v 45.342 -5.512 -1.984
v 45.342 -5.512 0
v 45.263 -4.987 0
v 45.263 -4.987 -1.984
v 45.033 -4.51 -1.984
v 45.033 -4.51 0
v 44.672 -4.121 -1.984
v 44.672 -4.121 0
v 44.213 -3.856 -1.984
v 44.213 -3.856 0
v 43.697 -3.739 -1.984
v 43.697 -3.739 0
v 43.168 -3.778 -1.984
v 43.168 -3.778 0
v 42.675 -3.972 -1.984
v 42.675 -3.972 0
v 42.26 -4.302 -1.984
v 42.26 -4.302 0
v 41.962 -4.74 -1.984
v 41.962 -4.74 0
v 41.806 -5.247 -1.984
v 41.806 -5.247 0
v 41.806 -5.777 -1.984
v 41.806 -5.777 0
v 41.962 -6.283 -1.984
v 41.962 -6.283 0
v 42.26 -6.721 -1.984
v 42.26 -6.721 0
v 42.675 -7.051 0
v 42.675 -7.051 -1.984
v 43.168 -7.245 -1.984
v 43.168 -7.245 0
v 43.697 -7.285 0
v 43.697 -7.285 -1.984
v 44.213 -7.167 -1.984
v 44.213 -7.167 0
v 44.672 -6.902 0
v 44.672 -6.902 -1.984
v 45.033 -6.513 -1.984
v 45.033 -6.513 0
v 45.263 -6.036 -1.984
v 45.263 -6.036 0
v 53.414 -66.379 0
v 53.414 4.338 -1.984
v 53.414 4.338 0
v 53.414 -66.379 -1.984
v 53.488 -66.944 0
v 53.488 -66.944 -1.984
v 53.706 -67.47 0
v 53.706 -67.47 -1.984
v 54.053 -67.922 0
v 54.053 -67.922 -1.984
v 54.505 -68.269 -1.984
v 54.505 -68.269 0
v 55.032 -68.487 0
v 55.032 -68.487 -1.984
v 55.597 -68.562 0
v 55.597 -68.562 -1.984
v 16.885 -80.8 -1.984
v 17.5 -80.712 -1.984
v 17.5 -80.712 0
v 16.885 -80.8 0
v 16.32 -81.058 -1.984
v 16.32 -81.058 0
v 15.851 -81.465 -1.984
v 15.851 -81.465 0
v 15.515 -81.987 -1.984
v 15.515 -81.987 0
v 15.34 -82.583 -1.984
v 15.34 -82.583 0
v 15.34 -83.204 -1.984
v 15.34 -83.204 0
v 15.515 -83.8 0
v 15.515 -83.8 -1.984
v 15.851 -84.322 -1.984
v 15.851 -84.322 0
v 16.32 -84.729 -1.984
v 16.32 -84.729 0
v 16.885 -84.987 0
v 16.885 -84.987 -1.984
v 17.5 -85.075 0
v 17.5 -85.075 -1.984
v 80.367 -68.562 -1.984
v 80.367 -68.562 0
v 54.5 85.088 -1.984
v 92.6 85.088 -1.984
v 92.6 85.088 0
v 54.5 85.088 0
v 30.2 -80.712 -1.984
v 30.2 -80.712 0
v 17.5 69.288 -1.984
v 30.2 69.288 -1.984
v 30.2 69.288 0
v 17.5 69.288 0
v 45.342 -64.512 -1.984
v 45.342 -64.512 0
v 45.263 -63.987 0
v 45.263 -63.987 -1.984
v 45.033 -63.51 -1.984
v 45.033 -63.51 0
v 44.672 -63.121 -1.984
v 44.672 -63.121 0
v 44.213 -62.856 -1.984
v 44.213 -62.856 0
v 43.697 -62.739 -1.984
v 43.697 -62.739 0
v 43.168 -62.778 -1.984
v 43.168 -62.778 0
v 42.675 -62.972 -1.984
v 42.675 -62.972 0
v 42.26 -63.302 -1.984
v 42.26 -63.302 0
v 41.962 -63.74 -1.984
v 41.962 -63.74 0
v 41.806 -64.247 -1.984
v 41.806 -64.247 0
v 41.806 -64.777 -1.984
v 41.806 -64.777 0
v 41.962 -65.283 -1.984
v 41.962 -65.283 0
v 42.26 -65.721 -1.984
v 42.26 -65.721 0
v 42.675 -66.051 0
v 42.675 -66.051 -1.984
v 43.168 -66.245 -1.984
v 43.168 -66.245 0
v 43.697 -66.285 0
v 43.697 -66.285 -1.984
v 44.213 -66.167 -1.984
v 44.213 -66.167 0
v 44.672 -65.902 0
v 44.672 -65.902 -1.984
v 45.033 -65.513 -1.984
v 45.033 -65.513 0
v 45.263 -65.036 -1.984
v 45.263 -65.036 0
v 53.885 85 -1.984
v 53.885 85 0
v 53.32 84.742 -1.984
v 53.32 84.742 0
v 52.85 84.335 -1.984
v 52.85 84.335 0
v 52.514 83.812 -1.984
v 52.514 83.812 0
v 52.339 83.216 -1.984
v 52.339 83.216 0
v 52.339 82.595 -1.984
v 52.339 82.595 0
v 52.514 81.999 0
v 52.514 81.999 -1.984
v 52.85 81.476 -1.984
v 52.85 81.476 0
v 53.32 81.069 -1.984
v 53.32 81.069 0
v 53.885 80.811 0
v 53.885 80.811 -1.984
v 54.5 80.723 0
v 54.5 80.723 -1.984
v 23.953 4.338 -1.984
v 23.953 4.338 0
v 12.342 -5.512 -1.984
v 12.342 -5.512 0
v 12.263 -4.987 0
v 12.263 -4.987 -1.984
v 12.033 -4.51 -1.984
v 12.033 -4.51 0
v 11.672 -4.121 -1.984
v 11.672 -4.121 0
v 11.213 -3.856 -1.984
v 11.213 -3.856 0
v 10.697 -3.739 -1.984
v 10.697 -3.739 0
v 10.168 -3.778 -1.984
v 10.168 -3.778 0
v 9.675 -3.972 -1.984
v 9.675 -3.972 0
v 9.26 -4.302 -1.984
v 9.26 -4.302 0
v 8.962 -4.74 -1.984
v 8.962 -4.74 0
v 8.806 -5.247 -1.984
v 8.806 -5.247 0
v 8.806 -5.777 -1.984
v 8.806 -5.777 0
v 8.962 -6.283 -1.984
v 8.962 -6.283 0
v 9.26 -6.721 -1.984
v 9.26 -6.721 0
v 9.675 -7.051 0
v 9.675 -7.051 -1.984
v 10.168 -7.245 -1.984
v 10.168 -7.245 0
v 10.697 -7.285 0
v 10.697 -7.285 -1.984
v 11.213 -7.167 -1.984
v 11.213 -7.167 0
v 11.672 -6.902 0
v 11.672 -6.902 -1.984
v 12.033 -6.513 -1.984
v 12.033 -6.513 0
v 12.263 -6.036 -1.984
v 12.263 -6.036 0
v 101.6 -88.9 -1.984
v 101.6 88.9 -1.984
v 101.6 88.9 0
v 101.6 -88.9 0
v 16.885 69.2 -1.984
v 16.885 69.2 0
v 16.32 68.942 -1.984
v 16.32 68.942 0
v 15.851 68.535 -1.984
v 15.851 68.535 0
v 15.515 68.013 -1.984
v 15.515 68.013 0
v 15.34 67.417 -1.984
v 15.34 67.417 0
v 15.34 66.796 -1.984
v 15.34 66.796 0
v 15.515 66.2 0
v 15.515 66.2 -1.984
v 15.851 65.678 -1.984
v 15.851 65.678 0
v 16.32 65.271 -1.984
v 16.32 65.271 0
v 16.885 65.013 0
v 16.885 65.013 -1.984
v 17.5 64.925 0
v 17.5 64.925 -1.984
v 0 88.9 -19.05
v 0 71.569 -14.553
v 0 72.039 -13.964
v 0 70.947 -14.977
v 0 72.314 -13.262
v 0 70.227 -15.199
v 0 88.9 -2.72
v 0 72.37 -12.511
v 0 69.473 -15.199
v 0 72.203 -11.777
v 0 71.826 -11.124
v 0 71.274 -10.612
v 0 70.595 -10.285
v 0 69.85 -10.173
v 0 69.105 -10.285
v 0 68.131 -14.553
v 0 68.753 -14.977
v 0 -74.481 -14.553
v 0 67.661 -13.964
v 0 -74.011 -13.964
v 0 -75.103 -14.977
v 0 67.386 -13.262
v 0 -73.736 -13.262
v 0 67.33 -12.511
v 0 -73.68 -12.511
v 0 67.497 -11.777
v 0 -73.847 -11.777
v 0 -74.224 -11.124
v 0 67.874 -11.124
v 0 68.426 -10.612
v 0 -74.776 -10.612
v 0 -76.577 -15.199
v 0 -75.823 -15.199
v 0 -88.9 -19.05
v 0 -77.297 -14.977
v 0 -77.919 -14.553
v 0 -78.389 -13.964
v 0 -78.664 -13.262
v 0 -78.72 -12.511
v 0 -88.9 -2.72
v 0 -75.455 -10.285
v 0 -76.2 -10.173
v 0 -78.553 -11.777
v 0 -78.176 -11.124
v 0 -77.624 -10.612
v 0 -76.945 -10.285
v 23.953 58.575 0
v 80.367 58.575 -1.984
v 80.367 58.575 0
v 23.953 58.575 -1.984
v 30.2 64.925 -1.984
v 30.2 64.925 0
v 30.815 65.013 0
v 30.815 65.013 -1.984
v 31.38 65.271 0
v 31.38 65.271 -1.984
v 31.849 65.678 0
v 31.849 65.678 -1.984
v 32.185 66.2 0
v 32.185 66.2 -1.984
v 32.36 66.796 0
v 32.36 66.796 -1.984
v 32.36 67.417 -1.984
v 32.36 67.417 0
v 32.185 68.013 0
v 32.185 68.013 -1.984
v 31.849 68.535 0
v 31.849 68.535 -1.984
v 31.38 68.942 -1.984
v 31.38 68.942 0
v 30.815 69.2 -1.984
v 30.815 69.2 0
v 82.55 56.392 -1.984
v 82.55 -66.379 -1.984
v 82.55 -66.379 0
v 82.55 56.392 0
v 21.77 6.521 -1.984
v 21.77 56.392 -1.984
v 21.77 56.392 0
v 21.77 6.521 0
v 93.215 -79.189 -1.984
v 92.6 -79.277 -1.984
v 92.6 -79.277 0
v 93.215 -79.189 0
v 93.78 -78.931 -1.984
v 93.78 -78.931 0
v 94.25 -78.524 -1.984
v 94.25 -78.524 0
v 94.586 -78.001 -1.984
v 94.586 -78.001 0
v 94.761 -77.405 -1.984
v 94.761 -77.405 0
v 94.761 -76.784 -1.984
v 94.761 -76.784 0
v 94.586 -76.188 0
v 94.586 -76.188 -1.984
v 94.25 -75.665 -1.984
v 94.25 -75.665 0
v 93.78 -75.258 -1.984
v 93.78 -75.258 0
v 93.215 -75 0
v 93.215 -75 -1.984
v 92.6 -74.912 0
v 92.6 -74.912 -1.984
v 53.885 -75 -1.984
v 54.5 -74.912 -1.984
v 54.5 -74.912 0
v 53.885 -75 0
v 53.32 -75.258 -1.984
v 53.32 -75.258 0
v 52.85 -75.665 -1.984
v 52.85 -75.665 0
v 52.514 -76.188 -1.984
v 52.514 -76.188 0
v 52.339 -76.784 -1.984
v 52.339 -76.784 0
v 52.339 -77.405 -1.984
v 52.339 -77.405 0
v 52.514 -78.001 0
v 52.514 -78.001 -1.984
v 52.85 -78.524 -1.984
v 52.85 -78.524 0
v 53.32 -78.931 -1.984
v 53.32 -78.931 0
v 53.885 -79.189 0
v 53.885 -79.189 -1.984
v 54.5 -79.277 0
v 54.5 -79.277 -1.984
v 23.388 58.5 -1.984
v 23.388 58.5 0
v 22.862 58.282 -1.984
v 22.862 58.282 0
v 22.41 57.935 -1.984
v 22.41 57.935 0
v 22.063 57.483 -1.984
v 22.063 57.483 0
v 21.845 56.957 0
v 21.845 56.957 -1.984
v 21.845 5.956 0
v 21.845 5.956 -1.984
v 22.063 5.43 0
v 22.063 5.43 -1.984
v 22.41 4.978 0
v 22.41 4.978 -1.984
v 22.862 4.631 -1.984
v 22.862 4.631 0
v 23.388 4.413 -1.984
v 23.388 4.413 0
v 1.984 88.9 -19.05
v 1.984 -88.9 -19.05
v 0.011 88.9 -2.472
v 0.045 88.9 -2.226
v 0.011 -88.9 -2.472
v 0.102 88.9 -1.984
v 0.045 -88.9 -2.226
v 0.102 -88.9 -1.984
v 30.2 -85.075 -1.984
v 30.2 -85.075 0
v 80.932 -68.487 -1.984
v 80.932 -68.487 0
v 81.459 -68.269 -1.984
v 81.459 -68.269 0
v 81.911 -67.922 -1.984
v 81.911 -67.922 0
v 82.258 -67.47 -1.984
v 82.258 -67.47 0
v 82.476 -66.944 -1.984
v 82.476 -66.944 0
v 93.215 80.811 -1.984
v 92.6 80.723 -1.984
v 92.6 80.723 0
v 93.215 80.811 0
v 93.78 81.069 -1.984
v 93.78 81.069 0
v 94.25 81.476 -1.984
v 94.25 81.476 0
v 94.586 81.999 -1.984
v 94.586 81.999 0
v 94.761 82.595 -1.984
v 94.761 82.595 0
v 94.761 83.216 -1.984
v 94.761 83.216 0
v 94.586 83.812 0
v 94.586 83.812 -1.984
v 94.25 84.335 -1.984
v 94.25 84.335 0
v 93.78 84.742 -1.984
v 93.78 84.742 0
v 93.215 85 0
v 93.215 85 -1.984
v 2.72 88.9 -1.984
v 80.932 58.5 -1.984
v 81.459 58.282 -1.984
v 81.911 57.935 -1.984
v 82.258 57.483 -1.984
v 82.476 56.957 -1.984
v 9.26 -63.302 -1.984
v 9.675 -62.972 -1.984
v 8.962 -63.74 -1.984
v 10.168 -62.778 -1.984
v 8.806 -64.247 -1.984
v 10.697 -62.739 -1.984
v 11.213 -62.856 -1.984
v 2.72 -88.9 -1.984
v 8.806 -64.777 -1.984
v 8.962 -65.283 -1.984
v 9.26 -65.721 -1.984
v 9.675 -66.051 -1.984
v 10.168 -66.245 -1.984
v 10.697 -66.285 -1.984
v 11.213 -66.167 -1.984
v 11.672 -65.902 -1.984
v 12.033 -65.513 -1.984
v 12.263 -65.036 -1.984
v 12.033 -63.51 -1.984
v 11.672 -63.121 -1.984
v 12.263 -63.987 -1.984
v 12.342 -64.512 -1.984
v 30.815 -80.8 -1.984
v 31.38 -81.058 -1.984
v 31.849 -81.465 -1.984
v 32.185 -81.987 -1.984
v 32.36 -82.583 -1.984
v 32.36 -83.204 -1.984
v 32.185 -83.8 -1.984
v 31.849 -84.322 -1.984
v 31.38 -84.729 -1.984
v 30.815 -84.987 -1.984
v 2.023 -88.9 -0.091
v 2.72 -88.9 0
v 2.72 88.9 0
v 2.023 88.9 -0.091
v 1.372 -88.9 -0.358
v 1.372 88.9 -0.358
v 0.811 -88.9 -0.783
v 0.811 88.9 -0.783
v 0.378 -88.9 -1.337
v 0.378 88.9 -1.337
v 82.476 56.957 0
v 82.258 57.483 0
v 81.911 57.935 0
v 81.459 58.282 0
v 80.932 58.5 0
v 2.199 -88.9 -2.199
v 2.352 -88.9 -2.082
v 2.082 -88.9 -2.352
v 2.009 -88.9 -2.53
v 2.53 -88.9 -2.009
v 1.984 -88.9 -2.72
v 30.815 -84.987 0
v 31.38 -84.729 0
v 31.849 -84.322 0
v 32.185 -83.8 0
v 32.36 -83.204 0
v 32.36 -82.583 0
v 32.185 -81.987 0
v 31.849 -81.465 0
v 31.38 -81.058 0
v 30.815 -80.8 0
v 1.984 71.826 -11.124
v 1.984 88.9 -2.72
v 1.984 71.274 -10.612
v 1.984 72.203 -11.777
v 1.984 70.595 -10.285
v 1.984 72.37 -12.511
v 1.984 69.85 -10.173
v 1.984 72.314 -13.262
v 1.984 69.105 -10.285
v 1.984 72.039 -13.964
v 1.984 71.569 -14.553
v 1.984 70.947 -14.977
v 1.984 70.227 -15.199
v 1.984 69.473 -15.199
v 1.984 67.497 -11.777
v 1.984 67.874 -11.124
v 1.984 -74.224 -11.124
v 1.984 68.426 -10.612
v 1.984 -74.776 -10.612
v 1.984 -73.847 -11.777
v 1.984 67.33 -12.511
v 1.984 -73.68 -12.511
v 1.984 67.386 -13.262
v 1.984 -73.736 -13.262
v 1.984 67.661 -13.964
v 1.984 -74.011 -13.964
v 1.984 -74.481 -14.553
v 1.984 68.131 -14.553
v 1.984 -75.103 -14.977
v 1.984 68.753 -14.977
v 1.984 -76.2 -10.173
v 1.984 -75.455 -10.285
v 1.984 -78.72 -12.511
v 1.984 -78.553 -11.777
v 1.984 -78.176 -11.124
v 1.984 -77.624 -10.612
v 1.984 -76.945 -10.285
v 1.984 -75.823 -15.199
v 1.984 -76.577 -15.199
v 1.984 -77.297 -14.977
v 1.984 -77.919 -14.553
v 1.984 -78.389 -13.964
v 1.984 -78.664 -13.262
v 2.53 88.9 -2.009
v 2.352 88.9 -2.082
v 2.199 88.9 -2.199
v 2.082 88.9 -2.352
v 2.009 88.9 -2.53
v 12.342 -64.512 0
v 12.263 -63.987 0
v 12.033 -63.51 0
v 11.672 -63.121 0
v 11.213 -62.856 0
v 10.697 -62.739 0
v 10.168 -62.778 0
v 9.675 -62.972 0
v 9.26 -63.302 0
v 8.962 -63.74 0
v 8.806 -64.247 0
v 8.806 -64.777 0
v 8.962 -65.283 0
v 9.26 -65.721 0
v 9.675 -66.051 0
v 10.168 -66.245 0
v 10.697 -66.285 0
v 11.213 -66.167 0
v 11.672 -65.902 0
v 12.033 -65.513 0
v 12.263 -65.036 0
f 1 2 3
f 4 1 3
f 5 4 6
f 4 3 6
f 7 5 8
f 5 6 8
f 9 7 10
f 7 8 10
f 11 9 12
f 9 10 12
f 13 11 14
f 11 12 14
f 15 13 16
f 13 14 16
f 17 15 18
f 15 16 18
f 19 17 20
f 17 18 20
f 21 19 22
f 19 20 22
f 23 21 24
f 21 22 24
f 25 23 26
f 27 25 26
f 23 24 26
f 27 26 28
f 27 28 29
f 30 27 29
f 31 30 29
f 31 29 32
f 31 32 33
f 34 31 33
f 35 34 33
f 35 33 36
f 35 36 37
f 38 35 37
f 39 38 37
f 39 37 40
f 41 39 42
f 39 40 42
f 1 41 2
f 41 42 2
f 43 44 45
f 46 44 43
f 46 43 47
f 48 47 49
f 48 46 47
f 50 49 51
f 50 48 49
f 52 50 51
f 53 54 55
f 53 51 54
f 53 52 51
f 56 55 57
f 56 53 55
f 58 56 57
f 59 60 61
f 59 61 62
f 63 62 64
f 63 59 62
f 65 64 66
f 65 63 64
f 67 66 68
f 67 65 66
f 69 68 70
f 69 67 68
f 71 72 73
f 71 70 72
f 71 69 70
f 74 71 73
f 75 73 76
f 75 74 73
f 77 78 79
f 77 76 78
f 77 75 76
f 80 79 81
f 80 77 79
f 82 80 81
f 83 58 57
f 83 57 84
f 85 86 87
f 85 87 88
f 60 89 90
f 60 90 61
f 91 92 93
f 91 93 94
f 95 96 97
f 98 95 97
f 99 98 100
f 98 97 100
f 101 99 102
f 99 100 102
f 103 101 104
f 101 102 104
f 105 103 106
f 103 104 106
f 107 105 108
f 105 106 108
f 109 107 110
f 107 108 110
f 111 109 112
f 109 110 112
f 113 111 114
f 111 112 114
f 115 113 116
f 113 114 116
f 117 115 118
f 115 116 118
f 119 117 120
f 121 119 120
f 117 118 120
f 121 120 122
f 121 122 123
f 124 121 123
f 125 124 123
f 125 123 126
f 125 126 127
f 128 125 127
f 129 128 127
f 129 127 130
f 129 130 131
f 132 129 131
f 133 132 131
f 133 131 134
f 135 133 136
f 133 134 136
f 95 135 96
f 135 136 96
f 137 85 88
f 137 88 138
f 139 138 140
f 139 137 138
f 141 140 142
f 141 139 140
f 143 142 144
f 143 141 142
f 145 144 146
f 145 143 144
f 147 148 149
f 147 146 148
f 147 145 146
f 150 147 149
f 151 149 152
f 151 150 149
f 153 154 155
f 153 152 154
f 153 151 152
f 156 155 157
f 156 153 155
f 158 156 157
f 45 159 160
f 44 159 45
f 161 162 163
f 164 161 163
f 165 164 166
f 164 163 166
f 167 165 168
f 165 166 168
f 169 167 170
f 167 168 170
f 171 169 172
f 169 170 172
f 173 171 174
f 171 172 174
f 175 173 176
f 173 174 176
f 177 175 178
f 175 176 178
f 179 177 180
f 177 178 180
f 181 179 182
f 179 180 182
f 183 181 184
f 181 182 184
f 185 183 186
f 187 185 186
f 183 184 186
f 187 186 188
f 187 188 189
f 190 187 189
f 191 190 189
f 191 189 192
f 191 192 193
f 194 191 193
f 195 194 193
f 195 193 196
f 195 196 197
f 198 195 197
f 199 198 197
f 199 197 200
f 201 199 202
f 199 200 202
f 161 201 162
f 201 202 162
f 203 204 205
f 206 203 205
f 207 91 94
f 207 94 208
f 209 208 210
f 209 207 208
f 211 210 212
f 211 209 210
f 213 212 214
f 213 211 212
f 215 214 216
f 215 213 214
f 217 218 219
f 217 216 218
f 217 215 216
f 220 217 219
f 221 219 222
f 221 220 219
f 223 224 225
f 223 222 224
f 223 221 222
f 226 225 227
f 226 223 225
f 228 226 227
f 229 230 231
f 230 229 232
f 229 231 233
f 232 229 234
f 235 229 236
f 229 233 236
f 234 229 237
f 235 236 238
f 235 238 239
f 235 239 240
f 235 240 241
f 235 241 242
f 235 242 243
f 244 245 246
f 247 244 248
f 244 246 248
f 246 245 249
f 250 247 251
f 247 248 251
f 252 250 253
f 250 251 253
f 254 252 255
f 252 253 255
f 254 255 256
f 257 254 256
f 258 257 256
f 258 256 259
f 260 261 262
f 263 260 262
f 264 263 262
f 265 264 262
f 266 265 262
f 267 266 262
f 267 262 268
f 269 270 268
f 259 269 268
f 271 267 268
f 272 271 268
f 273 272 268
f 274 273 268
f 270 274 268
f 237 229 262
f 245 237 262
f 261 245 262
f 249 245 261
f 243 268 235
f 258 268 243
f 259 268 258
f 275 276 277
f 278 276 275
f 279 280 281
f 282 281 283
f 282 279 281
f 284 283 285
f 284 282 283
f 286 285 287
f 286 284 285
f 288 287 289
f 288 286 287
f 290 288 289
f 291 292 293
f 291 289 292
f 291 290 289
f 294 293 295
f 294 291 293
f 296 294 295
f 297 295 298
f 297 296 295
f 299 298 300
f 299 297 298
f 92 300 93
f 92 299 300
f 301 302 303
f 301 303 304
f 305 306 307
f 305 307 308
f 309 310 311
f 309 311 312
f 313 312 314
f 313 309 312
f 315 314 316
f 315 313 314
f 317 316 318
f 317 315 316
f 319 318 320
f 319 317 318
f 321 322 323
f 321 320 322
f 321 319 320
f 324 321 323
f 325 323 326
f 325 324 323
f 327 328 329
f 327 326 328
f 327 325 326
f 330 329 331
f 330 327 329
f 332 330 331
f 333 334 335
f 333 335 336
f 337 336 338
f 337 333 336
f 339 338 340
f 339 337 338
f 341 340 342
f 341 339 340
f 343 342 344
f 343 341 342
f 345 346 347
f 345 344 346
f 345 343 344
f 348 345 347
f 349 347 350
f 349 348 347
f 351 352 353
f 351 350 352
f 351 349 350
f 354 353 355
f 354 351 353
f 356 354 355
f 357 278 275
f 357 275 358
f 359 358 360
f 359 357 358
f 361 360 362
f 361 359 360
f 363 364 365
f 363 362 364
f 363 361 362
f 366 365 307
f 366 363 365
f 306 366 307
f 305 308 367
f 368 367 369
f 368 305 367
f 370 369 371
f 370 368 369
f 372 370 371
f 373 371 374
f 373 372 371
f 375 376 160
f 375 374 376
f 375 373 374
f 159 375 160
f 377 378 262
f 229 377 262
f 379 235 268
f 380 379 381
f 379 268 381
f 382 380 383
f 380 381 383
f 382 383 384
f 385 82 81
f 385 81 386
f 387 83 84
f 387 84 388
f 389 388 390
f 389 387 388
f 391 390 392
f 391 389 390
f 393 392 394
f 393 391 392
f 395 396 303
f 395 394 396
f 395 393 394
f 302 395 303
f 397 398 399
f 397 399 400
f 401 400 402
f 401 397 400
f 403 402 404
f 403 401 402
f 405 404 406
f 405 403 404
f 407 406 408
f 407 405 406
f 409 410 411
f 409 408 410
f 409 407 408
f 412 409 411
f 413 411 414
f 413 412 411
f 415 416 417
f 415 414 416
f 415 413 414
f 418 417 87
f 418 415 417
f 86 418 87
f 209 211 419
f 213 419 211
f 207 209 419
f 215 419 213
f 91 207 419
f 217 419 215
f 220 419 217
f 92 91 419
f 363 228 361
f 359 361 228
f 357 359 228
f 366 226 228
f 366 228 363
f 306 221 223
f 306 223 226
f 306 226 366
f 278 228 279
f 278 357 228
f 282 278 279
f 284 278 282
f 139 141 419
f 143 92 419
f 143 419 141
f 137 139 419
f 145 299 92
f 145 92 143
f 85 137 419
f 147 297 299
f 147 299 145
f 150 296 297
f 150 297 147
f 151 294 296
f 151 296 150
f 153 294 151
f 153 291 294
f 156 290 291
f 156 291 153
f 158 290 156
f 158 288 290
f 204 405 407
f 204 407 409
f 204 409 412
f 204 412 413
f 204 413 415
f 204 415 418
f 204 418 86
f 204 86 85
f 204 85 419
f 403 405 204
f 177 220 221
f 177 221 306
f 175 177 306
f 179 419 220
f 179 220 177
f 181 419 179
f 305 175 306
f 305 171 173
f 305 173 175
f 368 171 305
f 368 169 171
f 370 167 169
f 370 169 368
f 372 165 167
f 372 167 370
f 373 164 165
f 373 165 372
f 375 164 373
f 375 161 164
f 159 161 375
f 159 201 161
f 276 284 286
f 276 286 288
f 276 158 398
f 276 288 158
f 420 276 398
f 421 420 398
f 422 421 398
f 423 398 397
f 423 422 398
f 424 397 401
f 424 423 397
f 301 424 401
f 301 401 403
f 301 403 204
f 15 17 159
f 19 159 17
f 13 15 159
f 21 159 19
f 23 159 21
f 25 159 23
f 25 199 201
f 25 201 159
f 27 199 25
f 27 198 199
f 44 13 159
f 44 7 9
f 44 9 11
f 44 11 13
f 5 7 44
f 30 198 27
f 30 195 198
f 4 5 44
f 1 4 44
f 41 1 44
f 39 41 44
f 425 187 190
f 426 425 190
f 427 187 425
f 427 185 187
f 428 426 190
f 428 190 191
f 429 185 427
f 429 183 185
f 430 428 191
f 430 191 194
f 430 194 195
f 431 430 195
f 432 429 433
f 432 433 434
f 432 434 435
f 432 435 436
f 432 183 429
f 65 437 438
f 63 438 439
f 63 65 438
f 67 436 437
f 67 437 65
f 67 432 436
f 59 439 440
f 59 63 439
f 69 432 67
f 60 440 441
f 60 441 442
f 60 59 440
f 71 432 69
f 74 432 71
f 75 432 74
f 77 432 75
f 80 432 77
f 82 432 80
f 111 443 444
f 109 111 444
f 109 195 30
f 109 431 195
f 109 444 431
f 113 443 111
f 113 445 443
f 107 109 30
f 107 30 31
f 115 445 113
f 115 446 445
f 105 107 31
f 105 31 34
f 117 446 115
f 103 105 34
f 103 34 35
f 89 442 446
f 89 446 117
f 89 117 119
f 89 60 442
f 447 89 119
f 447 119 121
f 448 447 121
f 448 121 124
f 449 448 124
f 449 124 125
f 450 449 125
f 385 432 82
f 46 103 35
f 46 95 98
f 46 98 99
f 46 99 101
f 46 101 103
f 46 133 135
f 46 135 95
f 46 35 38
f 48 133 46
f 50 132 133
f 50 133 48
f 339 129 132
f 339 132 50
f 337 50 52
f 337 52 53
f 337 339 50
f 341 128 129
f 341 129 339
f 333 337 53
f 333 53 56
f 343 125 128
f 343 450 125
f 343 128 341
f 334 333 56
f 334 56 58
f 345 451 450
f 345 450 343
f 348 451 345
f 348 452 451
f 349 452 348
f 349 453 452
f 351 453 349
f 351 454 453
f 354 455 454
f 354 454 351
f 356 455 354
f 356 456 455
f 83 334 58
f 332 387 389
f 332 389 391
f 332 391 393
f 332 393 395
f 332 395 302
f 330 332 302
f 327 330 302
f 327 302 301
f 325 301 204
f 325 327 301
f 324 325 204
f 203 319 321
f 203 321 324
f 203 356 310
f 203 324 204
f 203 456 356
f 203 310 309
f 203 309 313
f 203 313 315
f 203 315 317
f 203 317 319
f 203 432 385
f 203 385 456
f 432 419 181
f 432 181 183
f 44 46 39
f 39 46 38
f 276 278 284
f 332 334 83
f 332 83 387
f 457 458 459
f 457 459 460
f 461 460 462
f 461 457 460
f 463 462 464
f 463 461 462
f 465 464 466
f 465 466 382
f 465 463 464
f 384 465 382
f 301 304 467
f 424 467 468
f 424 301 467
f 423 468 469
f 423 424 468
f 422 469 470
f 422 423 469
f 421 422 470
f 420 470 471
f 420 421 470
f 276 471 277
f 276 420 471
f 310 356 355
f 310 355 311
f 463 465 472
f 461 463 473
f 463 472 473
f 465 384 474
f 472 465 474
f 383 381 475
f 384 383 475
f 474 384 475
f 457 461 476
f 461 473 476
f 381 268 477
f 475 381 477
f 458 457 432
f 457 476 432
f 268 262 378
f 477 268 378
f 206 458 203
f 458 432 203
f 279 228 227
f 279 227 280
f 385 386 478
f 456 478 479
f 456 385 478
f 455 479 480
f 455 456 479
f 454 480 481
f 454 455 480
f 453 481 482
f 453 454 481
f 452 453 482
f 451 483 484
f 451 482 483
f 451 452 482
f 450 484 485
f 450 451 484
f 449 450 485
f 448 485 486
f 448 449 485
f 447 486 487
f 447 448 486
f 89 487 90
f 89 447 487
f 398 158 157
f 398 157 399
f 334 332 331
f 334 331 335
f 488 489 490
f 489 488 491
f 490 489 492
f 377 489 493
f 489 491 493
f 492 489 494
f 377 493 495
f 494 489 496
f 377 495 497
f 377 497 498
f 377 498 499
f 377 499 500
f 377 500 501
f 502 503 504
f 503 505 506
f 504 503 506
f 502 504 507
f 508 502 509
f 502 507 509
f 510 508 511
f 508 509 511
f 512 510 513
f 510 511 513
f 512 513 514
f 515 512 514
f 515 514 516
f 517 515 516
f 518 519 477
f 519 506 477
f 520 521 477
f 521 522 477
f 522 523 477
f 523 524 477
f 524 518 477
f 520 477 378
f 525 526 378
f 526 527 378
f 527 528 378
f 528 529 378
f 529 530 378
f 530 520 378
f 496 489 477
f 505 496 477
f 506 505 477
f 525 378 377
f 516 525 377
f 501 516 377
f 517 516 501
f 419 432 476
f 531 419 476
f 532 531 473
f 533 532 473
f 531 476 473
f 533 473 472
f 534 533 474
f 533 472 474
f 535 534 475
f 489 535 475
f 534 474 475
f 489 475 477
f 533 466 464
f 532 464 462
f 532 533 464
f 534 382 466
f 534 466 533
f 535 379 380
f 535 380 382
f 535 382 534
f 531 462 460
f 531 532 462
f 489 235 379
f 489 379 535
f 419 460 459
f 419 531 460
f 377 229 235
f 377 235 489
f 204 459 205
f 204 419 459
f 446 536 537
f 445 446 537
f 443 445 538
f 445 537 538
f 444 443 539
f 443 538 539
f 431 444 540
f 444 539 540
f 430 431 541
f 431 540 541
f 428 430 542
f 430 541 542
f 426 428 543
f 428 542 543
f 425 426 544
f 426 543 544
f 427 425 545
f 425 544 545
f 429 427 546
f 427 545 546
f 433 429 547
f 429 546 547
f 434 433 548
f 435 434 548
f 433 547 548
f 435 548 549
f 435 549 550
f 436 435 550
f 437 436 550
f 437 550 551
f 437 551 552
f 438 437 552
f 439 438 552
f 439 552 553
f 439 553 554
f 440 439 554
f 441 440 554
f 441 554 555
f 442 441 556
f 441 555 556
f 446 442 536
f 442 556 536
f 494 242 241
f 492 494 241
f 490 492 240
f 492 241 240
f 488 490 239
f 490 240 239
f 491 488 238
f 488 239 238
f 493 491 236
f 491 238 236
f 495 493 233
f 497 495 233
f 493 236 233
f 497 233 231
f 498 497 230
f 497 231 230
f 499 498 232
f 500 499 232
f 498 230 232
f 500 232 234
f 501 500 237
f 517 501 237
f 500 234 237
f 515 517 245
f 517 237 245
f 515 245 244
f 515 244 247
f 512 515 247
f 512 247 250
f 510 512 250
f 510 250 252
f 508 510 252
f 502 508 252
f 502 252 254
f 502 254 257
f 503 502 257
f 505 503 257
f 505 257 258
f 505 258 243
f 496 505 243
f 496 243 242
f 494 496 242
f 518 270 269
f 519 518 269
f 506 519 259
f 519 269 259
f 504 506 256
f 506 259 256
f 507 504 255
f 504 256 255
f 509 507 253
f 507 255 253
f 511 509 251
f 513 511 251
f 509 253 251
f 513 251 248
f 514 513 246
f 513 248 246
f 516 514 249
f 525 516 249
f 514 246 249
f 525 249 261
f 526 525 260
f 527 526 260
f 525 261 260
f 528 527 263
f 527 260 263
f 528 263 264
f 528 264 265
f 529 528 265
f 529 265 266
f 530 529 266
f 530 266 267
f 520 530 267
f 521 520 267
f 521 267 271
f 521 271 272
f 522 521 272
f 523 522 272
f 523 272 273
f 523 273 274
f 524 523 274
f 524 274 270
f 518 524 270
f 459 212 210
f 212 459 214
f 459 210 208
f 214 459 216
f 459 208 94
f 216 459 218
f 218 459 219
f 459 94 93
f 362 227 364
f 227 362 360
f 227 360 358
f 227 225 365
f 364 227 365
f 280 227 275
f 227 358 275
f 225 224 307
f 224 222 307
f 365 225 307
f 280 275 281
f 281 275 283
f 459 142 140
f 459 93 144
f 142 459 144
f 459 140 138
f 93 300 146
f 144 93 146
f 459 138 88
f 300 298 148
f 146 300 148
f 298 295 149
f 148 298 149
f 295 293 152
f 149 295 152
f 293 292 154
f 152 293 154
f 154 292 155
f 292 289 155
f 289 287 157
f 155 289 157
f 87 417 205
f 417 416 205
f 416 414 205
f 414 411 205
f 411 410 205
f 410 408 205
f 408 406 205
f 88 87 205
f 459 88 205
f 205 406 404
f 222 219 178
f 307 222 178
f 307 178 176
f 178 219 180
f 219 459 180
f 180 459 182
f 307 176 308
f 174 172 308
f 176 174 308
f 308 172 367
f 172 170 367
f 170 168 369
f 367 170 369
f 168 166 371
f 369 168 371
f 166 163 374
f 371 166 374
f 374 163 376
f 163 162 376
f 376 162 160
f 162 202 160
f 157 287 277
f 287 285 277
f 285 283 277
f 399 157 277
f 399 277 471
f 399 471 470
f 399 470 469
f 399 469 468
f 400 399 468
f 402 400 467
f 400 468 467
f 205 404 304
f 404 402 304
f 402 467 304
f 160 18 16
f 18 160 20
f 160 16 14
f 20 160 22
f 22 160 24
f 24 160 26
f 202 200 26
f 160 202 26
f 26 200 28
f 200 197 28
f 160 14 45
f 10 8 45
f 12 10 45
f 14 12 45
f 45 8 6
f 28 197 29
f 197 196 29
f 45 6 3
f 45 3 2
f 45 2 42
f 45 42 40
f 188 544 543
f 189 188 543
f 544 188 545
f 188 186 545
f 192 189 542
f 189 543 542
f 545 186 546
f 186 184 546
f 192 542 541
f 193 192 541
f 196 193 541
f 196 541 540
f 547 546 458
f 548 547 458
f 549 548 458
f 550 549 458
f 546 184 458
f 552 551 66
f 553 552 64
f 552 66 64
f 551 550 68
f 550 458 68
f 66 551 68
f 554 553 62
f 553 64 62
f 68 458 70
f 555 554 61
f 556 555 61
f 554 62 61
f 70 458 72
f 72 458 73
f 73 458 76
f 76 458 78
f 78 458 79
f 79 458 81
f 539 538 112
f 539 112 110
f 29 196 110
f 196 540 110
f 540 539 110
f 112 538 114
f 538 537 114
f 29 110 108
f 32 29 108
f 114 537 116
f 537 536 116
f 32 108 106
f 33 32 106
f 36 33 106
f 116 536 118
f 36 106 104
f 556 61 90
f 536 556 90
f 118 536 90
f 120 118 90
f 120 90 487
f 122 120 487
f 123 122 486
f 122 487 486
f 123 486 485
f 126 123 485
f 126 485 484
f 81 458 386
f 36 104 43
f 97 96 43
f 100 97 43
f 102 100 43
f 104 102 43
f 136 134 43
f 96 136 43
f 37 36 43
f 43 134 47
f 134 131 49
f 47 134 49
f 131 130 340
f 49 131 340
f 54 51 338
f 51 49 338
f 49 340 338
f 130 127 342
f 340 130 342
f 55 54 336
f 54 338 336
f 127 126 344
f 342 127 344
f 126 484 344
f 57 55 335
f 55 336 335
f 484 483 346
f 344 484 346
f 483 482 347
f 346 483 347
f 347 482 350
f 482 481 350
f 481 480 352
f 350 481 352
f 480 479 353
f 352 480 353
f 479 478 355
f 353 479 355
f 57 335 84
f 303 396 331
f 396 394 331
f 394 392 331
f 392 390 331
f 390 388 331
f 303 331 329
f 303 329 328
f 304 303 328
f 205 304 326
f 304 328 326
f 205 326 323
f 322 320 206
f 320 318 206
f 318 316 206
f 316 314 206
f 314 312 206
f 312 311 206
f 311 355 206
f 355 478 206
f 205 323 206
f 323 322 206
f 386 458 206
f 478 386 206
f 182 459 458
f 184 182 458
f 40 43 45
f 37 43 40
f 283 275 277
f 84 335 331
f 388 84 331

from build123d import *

# Parameters (mm, degrees)
BOSS_EXTRUDE1_DEPTH        = 88.9
FLATTEN_BENDS1_START       = -88.9
FLATTEN_BENDS1_OUTLINE_W   = 1.98374
FLATTEN_BENDS1_OUTLINE_H   = 17.06626
FLATTEN_BENDS1_DEPTH       = 177.8
FLATTEN_BENDS1_2_OUTLINE_W = 16.324394327
FLATTEN_BENDS1_2_OUTLINE_H = 1.98374
FLATTEN_BENDS1_2_DEPTH     = 177.8
PROCESS_BENDS1_START       = -88.9
PROCESS_BENDS1_DEPTH       = 177.8
PROCESS_BENDS1_2_DEPTH     = 177.8
CUT_EXTRUDE1_DEPTH         = 137.077284035
F_8_0_199_DIAMETER_HOLE1_D = 5.0546
SKETCH14_R                 = 1.778
CUT_EXTRUDE2_DEPTH         = 1.98374


# Read off the part's stored shape, not the designer's step: Flatten-Bends1, Process-Bends1
with BuildPart() as part:
    # Sketch1 → Boss-Extrude1 (new, symmetric)
    with BuildSketch(Plane(origin=(0, 0, 0), x_dir=(1, 0, 0), z_dir=(0, 1, 0))):
        Polygon((0, 0), (0, 19.05), (1.98374, 19.05), (1.98374, 1.98374), (101.6, 1.98374), (101.6, 0), align=None)
    extrude(amount=BOSS_EXTRUDE1_DEPTH, both=True)

    # Flatten-Bends1 outline → Flatten-Bends1 (cut)
    with BuildSketch(Plane(origin=(0, 0, 0), x_dir=(1, 0, 0), z_dir=(0, 1, 0)).offset(FLATTEN_BENDS1_START)):
        with Locations((0.99187, 10.51687)):
            Rectangle(FLATTEN_BENDS1_OUTLINE_W, FLATTEN_BENDS1_OUTLINE_H)
    extrude(amount=FLATTEN_BENDS1_DEPTH, mode=Mode.SUBTRACT)

    # Flatten-Bends1 2 outline → Flatten-Bends1 2 (add)
    with BuildSketch(Plane(origin=(0, 0, 0), x_dir=(1, 0, 0), z_dir=(0, 1, 0)).offset(FLATTEN_BENDS1_START)):
        with Locations((-8.162197164, 0.99187)):
            Rectangle(FLATTEN_BENDS1_2_OUTLINE_W, FLATTEN_BENDS1_2_OUTLINE_H)
    extrude(amount=FLATTEN_BENDS1_2_DEPTH)

    # Process-Bends1 outline → Process-Bends1 (cut)
    with BuildSketch(Plane(origin=(0, 0, 0), x_dir=(1, 0, 0), z_dir=(0, 1, 0)).offset(PROCESS_BENDS1_START)):
        with BuildLine():
            ThreePointArc((2.72034, 0), (1.077712947, 0.551924431), (0.101624637, 1.98374))
            Line((0.101624637, 1.98374), (-16.324394327, 1.98374))
            Line((-16.324394327, 1.98374), (-16.324394327, 0))
            Line((-16.324394327, 0), (2.72034, 0))
        make_face()
    extrude(amount=PROCESS_BENDS1_DEPTH, mode=Mode.SUBTRACT)

    # Process-Bends1 2 outline → Process-Bends1 2 (add)
    with BuildSketch(Plane(origin=(0, 0, 0), x_dir=(1, 0, 0), z_dir=(0, 1, 0)).offset(PROCESS_BENDS1_START)):
        with BuildLine():
            Line((1.98374, 2.72034), (1.98374, 19.05))
            Line((1.98374, 19.05), (0, 19.05))
            Line((0, 19.05), (0, 2.72034))
            ThreePointArc((0, 2.72034), (0.025525919, 2.348551375), (0.101624637, 1.98374))
            Line((0.101624637, 1.98374), (2.72034, 1.98374))
            ThreePointArc((2.72034, 1.98374), (2.199485145, 2.199485145), (1.98374, 2.72034))
        make_face()
    extrude(amount=PROCESS_BENDS1_2_DEPTH)

    # Sketch6 → Cut-Extrude1 (cut, through all)
    with BuildSketch(Plane(origin=(0, 0, -1.98374), x_dir=(-1, 0, 0), z_dir=(0, 0, -1))):
        with BuildLine():
            Line((-92.60000004, -74.9115748), (-54.50000004, -74.9115748))
            ThreePointArc((-54.50000004, -74.9115748), (-52.31717484, -77.0944), (-54.50000004, -79.2772252))
            Line((-54.50000004, -79.2772252), (-92.60000004, -79.2772252))
            ThreePointArc((-92.60000004, -79.2772252), (-94.78282524, -77.0944), (-92.60000004, -74.9115748))
        make_face()
        with BuildLine():
            Line((-92.60000004, 85.0884252), (-54.50000004, 85.0884252))
            ThreePointArc((-54.50000004, 85.0884252), (-52.31717484, 82.9056), (-54.50000004, 80.7227748))
            Line((-54.50000004, 80.7227748), (-92.60000004, 80.7227748))
            ThreePointArc((-92.60000004, 80.7227748), (-94.78282524, 82.9056), (-92.60000004, 85.0884252))
        make_face()
        with BuildLine():
            Line((-30.2, 69.28846), (-17.5, 69.28846))
            ThreePointArc((-17.5, 69.28846), (-15.31814, 67.1066), (-17.5, 64.92474))
            Line((-17.5, 64.92474), (-30.2, 64.92474))
            ThreePointArc((-30.2, 64.92474), (-32.38186, 67.1066), (-30.2, 69.28846))
        make_face()
        with BuildLine():
            Line((-30.2, -80.71154), (-17.5, -80.71154))
            ThreePointArc((-17.5, -80.71154), (-15.31814, -82.8934), (-17.5, -85.07526))
            Line((-17.5, -85.07526), (-30.2, -85.07526))
            ThreePointArc((-30.2, -85.07526), (-32.38186, -82.8934), (-30.2, -80.71154))
        make_face()
        with BuildLine():
            Line((-23.9531652, 4.33846), (-53.41374, 4.33846))
            Line((-53.41374, 4.33846), (-53.41374, -66.3787496))
            ThreePointArc((-53.41374, -66.3787496), (-54.053074699, -67.922240101), (-55.5965652, -68.5615748))
            Line((-55.5965652, -68.5615748), (-80.3671748, -68.5615748))
            ThreePointArc((-80.3671748, -68.5615748), (-81.910665301, -67.922240101), (-82.55, -66.3787496))
            Line((-82.55, -66.3787496), (-82.55, 56.3919148))
            ThreePointArc((-82.55, 56.3919148), (-81.910665301, 57.935405301), (-80.3671748, 58.57474))
            Line((-80.3671748, 58.57474), (-23.9531652, 58.57474))
            ThreePointArc((-23.9531652, 58.57474), (-22.409674699, 57.935405301), (-21.77034, 56.3919148))
            Line((-21.77034, 56.3919148), (-21.77034, 6.5212852))
            ThreePointArc((-21.77034, 6.5212852), (-22.409674699, 4.977794699), (-23.9531652, 4.33846))
        make_face()
    extrude(amount=-CUT_EXTRUDE1_DEPTH, mode=Mode.SUBTRACT)

    # #8 (0.199) Diameter Hole1 (through all)
    with Locations(Plane(origin=(1.98374, 0, 0), x_dir=(0, 0, -1), z_dir=(1, 0, 0))):
        with Locations((12.7, 69.85), (12.7, -76.2)):
            Hole(F_8_0_199_DIAMETER_HOLE1_D / 2)

    # Sketch14 → Cut-Extrude2 (cut)
    with BuildSketch(Plane.XY):
        with Locations((10.56374, -5.51154)):
            Circle(SKETCH14_R)
        with Locations((43.56374, -5.51154)):
            Circle(SKETCH14_R)
        with Locations((10.56374, -64.51154)):
            Circle(SKETCH14_R)
        with Locations((43.56374, -64.51154)):
            Circle(SKETCH14_R)
    extrude(amount=-CUT_EXTRUDE2_DEPTH, mode=Mode.SUBTRACT)


solid = part.part
